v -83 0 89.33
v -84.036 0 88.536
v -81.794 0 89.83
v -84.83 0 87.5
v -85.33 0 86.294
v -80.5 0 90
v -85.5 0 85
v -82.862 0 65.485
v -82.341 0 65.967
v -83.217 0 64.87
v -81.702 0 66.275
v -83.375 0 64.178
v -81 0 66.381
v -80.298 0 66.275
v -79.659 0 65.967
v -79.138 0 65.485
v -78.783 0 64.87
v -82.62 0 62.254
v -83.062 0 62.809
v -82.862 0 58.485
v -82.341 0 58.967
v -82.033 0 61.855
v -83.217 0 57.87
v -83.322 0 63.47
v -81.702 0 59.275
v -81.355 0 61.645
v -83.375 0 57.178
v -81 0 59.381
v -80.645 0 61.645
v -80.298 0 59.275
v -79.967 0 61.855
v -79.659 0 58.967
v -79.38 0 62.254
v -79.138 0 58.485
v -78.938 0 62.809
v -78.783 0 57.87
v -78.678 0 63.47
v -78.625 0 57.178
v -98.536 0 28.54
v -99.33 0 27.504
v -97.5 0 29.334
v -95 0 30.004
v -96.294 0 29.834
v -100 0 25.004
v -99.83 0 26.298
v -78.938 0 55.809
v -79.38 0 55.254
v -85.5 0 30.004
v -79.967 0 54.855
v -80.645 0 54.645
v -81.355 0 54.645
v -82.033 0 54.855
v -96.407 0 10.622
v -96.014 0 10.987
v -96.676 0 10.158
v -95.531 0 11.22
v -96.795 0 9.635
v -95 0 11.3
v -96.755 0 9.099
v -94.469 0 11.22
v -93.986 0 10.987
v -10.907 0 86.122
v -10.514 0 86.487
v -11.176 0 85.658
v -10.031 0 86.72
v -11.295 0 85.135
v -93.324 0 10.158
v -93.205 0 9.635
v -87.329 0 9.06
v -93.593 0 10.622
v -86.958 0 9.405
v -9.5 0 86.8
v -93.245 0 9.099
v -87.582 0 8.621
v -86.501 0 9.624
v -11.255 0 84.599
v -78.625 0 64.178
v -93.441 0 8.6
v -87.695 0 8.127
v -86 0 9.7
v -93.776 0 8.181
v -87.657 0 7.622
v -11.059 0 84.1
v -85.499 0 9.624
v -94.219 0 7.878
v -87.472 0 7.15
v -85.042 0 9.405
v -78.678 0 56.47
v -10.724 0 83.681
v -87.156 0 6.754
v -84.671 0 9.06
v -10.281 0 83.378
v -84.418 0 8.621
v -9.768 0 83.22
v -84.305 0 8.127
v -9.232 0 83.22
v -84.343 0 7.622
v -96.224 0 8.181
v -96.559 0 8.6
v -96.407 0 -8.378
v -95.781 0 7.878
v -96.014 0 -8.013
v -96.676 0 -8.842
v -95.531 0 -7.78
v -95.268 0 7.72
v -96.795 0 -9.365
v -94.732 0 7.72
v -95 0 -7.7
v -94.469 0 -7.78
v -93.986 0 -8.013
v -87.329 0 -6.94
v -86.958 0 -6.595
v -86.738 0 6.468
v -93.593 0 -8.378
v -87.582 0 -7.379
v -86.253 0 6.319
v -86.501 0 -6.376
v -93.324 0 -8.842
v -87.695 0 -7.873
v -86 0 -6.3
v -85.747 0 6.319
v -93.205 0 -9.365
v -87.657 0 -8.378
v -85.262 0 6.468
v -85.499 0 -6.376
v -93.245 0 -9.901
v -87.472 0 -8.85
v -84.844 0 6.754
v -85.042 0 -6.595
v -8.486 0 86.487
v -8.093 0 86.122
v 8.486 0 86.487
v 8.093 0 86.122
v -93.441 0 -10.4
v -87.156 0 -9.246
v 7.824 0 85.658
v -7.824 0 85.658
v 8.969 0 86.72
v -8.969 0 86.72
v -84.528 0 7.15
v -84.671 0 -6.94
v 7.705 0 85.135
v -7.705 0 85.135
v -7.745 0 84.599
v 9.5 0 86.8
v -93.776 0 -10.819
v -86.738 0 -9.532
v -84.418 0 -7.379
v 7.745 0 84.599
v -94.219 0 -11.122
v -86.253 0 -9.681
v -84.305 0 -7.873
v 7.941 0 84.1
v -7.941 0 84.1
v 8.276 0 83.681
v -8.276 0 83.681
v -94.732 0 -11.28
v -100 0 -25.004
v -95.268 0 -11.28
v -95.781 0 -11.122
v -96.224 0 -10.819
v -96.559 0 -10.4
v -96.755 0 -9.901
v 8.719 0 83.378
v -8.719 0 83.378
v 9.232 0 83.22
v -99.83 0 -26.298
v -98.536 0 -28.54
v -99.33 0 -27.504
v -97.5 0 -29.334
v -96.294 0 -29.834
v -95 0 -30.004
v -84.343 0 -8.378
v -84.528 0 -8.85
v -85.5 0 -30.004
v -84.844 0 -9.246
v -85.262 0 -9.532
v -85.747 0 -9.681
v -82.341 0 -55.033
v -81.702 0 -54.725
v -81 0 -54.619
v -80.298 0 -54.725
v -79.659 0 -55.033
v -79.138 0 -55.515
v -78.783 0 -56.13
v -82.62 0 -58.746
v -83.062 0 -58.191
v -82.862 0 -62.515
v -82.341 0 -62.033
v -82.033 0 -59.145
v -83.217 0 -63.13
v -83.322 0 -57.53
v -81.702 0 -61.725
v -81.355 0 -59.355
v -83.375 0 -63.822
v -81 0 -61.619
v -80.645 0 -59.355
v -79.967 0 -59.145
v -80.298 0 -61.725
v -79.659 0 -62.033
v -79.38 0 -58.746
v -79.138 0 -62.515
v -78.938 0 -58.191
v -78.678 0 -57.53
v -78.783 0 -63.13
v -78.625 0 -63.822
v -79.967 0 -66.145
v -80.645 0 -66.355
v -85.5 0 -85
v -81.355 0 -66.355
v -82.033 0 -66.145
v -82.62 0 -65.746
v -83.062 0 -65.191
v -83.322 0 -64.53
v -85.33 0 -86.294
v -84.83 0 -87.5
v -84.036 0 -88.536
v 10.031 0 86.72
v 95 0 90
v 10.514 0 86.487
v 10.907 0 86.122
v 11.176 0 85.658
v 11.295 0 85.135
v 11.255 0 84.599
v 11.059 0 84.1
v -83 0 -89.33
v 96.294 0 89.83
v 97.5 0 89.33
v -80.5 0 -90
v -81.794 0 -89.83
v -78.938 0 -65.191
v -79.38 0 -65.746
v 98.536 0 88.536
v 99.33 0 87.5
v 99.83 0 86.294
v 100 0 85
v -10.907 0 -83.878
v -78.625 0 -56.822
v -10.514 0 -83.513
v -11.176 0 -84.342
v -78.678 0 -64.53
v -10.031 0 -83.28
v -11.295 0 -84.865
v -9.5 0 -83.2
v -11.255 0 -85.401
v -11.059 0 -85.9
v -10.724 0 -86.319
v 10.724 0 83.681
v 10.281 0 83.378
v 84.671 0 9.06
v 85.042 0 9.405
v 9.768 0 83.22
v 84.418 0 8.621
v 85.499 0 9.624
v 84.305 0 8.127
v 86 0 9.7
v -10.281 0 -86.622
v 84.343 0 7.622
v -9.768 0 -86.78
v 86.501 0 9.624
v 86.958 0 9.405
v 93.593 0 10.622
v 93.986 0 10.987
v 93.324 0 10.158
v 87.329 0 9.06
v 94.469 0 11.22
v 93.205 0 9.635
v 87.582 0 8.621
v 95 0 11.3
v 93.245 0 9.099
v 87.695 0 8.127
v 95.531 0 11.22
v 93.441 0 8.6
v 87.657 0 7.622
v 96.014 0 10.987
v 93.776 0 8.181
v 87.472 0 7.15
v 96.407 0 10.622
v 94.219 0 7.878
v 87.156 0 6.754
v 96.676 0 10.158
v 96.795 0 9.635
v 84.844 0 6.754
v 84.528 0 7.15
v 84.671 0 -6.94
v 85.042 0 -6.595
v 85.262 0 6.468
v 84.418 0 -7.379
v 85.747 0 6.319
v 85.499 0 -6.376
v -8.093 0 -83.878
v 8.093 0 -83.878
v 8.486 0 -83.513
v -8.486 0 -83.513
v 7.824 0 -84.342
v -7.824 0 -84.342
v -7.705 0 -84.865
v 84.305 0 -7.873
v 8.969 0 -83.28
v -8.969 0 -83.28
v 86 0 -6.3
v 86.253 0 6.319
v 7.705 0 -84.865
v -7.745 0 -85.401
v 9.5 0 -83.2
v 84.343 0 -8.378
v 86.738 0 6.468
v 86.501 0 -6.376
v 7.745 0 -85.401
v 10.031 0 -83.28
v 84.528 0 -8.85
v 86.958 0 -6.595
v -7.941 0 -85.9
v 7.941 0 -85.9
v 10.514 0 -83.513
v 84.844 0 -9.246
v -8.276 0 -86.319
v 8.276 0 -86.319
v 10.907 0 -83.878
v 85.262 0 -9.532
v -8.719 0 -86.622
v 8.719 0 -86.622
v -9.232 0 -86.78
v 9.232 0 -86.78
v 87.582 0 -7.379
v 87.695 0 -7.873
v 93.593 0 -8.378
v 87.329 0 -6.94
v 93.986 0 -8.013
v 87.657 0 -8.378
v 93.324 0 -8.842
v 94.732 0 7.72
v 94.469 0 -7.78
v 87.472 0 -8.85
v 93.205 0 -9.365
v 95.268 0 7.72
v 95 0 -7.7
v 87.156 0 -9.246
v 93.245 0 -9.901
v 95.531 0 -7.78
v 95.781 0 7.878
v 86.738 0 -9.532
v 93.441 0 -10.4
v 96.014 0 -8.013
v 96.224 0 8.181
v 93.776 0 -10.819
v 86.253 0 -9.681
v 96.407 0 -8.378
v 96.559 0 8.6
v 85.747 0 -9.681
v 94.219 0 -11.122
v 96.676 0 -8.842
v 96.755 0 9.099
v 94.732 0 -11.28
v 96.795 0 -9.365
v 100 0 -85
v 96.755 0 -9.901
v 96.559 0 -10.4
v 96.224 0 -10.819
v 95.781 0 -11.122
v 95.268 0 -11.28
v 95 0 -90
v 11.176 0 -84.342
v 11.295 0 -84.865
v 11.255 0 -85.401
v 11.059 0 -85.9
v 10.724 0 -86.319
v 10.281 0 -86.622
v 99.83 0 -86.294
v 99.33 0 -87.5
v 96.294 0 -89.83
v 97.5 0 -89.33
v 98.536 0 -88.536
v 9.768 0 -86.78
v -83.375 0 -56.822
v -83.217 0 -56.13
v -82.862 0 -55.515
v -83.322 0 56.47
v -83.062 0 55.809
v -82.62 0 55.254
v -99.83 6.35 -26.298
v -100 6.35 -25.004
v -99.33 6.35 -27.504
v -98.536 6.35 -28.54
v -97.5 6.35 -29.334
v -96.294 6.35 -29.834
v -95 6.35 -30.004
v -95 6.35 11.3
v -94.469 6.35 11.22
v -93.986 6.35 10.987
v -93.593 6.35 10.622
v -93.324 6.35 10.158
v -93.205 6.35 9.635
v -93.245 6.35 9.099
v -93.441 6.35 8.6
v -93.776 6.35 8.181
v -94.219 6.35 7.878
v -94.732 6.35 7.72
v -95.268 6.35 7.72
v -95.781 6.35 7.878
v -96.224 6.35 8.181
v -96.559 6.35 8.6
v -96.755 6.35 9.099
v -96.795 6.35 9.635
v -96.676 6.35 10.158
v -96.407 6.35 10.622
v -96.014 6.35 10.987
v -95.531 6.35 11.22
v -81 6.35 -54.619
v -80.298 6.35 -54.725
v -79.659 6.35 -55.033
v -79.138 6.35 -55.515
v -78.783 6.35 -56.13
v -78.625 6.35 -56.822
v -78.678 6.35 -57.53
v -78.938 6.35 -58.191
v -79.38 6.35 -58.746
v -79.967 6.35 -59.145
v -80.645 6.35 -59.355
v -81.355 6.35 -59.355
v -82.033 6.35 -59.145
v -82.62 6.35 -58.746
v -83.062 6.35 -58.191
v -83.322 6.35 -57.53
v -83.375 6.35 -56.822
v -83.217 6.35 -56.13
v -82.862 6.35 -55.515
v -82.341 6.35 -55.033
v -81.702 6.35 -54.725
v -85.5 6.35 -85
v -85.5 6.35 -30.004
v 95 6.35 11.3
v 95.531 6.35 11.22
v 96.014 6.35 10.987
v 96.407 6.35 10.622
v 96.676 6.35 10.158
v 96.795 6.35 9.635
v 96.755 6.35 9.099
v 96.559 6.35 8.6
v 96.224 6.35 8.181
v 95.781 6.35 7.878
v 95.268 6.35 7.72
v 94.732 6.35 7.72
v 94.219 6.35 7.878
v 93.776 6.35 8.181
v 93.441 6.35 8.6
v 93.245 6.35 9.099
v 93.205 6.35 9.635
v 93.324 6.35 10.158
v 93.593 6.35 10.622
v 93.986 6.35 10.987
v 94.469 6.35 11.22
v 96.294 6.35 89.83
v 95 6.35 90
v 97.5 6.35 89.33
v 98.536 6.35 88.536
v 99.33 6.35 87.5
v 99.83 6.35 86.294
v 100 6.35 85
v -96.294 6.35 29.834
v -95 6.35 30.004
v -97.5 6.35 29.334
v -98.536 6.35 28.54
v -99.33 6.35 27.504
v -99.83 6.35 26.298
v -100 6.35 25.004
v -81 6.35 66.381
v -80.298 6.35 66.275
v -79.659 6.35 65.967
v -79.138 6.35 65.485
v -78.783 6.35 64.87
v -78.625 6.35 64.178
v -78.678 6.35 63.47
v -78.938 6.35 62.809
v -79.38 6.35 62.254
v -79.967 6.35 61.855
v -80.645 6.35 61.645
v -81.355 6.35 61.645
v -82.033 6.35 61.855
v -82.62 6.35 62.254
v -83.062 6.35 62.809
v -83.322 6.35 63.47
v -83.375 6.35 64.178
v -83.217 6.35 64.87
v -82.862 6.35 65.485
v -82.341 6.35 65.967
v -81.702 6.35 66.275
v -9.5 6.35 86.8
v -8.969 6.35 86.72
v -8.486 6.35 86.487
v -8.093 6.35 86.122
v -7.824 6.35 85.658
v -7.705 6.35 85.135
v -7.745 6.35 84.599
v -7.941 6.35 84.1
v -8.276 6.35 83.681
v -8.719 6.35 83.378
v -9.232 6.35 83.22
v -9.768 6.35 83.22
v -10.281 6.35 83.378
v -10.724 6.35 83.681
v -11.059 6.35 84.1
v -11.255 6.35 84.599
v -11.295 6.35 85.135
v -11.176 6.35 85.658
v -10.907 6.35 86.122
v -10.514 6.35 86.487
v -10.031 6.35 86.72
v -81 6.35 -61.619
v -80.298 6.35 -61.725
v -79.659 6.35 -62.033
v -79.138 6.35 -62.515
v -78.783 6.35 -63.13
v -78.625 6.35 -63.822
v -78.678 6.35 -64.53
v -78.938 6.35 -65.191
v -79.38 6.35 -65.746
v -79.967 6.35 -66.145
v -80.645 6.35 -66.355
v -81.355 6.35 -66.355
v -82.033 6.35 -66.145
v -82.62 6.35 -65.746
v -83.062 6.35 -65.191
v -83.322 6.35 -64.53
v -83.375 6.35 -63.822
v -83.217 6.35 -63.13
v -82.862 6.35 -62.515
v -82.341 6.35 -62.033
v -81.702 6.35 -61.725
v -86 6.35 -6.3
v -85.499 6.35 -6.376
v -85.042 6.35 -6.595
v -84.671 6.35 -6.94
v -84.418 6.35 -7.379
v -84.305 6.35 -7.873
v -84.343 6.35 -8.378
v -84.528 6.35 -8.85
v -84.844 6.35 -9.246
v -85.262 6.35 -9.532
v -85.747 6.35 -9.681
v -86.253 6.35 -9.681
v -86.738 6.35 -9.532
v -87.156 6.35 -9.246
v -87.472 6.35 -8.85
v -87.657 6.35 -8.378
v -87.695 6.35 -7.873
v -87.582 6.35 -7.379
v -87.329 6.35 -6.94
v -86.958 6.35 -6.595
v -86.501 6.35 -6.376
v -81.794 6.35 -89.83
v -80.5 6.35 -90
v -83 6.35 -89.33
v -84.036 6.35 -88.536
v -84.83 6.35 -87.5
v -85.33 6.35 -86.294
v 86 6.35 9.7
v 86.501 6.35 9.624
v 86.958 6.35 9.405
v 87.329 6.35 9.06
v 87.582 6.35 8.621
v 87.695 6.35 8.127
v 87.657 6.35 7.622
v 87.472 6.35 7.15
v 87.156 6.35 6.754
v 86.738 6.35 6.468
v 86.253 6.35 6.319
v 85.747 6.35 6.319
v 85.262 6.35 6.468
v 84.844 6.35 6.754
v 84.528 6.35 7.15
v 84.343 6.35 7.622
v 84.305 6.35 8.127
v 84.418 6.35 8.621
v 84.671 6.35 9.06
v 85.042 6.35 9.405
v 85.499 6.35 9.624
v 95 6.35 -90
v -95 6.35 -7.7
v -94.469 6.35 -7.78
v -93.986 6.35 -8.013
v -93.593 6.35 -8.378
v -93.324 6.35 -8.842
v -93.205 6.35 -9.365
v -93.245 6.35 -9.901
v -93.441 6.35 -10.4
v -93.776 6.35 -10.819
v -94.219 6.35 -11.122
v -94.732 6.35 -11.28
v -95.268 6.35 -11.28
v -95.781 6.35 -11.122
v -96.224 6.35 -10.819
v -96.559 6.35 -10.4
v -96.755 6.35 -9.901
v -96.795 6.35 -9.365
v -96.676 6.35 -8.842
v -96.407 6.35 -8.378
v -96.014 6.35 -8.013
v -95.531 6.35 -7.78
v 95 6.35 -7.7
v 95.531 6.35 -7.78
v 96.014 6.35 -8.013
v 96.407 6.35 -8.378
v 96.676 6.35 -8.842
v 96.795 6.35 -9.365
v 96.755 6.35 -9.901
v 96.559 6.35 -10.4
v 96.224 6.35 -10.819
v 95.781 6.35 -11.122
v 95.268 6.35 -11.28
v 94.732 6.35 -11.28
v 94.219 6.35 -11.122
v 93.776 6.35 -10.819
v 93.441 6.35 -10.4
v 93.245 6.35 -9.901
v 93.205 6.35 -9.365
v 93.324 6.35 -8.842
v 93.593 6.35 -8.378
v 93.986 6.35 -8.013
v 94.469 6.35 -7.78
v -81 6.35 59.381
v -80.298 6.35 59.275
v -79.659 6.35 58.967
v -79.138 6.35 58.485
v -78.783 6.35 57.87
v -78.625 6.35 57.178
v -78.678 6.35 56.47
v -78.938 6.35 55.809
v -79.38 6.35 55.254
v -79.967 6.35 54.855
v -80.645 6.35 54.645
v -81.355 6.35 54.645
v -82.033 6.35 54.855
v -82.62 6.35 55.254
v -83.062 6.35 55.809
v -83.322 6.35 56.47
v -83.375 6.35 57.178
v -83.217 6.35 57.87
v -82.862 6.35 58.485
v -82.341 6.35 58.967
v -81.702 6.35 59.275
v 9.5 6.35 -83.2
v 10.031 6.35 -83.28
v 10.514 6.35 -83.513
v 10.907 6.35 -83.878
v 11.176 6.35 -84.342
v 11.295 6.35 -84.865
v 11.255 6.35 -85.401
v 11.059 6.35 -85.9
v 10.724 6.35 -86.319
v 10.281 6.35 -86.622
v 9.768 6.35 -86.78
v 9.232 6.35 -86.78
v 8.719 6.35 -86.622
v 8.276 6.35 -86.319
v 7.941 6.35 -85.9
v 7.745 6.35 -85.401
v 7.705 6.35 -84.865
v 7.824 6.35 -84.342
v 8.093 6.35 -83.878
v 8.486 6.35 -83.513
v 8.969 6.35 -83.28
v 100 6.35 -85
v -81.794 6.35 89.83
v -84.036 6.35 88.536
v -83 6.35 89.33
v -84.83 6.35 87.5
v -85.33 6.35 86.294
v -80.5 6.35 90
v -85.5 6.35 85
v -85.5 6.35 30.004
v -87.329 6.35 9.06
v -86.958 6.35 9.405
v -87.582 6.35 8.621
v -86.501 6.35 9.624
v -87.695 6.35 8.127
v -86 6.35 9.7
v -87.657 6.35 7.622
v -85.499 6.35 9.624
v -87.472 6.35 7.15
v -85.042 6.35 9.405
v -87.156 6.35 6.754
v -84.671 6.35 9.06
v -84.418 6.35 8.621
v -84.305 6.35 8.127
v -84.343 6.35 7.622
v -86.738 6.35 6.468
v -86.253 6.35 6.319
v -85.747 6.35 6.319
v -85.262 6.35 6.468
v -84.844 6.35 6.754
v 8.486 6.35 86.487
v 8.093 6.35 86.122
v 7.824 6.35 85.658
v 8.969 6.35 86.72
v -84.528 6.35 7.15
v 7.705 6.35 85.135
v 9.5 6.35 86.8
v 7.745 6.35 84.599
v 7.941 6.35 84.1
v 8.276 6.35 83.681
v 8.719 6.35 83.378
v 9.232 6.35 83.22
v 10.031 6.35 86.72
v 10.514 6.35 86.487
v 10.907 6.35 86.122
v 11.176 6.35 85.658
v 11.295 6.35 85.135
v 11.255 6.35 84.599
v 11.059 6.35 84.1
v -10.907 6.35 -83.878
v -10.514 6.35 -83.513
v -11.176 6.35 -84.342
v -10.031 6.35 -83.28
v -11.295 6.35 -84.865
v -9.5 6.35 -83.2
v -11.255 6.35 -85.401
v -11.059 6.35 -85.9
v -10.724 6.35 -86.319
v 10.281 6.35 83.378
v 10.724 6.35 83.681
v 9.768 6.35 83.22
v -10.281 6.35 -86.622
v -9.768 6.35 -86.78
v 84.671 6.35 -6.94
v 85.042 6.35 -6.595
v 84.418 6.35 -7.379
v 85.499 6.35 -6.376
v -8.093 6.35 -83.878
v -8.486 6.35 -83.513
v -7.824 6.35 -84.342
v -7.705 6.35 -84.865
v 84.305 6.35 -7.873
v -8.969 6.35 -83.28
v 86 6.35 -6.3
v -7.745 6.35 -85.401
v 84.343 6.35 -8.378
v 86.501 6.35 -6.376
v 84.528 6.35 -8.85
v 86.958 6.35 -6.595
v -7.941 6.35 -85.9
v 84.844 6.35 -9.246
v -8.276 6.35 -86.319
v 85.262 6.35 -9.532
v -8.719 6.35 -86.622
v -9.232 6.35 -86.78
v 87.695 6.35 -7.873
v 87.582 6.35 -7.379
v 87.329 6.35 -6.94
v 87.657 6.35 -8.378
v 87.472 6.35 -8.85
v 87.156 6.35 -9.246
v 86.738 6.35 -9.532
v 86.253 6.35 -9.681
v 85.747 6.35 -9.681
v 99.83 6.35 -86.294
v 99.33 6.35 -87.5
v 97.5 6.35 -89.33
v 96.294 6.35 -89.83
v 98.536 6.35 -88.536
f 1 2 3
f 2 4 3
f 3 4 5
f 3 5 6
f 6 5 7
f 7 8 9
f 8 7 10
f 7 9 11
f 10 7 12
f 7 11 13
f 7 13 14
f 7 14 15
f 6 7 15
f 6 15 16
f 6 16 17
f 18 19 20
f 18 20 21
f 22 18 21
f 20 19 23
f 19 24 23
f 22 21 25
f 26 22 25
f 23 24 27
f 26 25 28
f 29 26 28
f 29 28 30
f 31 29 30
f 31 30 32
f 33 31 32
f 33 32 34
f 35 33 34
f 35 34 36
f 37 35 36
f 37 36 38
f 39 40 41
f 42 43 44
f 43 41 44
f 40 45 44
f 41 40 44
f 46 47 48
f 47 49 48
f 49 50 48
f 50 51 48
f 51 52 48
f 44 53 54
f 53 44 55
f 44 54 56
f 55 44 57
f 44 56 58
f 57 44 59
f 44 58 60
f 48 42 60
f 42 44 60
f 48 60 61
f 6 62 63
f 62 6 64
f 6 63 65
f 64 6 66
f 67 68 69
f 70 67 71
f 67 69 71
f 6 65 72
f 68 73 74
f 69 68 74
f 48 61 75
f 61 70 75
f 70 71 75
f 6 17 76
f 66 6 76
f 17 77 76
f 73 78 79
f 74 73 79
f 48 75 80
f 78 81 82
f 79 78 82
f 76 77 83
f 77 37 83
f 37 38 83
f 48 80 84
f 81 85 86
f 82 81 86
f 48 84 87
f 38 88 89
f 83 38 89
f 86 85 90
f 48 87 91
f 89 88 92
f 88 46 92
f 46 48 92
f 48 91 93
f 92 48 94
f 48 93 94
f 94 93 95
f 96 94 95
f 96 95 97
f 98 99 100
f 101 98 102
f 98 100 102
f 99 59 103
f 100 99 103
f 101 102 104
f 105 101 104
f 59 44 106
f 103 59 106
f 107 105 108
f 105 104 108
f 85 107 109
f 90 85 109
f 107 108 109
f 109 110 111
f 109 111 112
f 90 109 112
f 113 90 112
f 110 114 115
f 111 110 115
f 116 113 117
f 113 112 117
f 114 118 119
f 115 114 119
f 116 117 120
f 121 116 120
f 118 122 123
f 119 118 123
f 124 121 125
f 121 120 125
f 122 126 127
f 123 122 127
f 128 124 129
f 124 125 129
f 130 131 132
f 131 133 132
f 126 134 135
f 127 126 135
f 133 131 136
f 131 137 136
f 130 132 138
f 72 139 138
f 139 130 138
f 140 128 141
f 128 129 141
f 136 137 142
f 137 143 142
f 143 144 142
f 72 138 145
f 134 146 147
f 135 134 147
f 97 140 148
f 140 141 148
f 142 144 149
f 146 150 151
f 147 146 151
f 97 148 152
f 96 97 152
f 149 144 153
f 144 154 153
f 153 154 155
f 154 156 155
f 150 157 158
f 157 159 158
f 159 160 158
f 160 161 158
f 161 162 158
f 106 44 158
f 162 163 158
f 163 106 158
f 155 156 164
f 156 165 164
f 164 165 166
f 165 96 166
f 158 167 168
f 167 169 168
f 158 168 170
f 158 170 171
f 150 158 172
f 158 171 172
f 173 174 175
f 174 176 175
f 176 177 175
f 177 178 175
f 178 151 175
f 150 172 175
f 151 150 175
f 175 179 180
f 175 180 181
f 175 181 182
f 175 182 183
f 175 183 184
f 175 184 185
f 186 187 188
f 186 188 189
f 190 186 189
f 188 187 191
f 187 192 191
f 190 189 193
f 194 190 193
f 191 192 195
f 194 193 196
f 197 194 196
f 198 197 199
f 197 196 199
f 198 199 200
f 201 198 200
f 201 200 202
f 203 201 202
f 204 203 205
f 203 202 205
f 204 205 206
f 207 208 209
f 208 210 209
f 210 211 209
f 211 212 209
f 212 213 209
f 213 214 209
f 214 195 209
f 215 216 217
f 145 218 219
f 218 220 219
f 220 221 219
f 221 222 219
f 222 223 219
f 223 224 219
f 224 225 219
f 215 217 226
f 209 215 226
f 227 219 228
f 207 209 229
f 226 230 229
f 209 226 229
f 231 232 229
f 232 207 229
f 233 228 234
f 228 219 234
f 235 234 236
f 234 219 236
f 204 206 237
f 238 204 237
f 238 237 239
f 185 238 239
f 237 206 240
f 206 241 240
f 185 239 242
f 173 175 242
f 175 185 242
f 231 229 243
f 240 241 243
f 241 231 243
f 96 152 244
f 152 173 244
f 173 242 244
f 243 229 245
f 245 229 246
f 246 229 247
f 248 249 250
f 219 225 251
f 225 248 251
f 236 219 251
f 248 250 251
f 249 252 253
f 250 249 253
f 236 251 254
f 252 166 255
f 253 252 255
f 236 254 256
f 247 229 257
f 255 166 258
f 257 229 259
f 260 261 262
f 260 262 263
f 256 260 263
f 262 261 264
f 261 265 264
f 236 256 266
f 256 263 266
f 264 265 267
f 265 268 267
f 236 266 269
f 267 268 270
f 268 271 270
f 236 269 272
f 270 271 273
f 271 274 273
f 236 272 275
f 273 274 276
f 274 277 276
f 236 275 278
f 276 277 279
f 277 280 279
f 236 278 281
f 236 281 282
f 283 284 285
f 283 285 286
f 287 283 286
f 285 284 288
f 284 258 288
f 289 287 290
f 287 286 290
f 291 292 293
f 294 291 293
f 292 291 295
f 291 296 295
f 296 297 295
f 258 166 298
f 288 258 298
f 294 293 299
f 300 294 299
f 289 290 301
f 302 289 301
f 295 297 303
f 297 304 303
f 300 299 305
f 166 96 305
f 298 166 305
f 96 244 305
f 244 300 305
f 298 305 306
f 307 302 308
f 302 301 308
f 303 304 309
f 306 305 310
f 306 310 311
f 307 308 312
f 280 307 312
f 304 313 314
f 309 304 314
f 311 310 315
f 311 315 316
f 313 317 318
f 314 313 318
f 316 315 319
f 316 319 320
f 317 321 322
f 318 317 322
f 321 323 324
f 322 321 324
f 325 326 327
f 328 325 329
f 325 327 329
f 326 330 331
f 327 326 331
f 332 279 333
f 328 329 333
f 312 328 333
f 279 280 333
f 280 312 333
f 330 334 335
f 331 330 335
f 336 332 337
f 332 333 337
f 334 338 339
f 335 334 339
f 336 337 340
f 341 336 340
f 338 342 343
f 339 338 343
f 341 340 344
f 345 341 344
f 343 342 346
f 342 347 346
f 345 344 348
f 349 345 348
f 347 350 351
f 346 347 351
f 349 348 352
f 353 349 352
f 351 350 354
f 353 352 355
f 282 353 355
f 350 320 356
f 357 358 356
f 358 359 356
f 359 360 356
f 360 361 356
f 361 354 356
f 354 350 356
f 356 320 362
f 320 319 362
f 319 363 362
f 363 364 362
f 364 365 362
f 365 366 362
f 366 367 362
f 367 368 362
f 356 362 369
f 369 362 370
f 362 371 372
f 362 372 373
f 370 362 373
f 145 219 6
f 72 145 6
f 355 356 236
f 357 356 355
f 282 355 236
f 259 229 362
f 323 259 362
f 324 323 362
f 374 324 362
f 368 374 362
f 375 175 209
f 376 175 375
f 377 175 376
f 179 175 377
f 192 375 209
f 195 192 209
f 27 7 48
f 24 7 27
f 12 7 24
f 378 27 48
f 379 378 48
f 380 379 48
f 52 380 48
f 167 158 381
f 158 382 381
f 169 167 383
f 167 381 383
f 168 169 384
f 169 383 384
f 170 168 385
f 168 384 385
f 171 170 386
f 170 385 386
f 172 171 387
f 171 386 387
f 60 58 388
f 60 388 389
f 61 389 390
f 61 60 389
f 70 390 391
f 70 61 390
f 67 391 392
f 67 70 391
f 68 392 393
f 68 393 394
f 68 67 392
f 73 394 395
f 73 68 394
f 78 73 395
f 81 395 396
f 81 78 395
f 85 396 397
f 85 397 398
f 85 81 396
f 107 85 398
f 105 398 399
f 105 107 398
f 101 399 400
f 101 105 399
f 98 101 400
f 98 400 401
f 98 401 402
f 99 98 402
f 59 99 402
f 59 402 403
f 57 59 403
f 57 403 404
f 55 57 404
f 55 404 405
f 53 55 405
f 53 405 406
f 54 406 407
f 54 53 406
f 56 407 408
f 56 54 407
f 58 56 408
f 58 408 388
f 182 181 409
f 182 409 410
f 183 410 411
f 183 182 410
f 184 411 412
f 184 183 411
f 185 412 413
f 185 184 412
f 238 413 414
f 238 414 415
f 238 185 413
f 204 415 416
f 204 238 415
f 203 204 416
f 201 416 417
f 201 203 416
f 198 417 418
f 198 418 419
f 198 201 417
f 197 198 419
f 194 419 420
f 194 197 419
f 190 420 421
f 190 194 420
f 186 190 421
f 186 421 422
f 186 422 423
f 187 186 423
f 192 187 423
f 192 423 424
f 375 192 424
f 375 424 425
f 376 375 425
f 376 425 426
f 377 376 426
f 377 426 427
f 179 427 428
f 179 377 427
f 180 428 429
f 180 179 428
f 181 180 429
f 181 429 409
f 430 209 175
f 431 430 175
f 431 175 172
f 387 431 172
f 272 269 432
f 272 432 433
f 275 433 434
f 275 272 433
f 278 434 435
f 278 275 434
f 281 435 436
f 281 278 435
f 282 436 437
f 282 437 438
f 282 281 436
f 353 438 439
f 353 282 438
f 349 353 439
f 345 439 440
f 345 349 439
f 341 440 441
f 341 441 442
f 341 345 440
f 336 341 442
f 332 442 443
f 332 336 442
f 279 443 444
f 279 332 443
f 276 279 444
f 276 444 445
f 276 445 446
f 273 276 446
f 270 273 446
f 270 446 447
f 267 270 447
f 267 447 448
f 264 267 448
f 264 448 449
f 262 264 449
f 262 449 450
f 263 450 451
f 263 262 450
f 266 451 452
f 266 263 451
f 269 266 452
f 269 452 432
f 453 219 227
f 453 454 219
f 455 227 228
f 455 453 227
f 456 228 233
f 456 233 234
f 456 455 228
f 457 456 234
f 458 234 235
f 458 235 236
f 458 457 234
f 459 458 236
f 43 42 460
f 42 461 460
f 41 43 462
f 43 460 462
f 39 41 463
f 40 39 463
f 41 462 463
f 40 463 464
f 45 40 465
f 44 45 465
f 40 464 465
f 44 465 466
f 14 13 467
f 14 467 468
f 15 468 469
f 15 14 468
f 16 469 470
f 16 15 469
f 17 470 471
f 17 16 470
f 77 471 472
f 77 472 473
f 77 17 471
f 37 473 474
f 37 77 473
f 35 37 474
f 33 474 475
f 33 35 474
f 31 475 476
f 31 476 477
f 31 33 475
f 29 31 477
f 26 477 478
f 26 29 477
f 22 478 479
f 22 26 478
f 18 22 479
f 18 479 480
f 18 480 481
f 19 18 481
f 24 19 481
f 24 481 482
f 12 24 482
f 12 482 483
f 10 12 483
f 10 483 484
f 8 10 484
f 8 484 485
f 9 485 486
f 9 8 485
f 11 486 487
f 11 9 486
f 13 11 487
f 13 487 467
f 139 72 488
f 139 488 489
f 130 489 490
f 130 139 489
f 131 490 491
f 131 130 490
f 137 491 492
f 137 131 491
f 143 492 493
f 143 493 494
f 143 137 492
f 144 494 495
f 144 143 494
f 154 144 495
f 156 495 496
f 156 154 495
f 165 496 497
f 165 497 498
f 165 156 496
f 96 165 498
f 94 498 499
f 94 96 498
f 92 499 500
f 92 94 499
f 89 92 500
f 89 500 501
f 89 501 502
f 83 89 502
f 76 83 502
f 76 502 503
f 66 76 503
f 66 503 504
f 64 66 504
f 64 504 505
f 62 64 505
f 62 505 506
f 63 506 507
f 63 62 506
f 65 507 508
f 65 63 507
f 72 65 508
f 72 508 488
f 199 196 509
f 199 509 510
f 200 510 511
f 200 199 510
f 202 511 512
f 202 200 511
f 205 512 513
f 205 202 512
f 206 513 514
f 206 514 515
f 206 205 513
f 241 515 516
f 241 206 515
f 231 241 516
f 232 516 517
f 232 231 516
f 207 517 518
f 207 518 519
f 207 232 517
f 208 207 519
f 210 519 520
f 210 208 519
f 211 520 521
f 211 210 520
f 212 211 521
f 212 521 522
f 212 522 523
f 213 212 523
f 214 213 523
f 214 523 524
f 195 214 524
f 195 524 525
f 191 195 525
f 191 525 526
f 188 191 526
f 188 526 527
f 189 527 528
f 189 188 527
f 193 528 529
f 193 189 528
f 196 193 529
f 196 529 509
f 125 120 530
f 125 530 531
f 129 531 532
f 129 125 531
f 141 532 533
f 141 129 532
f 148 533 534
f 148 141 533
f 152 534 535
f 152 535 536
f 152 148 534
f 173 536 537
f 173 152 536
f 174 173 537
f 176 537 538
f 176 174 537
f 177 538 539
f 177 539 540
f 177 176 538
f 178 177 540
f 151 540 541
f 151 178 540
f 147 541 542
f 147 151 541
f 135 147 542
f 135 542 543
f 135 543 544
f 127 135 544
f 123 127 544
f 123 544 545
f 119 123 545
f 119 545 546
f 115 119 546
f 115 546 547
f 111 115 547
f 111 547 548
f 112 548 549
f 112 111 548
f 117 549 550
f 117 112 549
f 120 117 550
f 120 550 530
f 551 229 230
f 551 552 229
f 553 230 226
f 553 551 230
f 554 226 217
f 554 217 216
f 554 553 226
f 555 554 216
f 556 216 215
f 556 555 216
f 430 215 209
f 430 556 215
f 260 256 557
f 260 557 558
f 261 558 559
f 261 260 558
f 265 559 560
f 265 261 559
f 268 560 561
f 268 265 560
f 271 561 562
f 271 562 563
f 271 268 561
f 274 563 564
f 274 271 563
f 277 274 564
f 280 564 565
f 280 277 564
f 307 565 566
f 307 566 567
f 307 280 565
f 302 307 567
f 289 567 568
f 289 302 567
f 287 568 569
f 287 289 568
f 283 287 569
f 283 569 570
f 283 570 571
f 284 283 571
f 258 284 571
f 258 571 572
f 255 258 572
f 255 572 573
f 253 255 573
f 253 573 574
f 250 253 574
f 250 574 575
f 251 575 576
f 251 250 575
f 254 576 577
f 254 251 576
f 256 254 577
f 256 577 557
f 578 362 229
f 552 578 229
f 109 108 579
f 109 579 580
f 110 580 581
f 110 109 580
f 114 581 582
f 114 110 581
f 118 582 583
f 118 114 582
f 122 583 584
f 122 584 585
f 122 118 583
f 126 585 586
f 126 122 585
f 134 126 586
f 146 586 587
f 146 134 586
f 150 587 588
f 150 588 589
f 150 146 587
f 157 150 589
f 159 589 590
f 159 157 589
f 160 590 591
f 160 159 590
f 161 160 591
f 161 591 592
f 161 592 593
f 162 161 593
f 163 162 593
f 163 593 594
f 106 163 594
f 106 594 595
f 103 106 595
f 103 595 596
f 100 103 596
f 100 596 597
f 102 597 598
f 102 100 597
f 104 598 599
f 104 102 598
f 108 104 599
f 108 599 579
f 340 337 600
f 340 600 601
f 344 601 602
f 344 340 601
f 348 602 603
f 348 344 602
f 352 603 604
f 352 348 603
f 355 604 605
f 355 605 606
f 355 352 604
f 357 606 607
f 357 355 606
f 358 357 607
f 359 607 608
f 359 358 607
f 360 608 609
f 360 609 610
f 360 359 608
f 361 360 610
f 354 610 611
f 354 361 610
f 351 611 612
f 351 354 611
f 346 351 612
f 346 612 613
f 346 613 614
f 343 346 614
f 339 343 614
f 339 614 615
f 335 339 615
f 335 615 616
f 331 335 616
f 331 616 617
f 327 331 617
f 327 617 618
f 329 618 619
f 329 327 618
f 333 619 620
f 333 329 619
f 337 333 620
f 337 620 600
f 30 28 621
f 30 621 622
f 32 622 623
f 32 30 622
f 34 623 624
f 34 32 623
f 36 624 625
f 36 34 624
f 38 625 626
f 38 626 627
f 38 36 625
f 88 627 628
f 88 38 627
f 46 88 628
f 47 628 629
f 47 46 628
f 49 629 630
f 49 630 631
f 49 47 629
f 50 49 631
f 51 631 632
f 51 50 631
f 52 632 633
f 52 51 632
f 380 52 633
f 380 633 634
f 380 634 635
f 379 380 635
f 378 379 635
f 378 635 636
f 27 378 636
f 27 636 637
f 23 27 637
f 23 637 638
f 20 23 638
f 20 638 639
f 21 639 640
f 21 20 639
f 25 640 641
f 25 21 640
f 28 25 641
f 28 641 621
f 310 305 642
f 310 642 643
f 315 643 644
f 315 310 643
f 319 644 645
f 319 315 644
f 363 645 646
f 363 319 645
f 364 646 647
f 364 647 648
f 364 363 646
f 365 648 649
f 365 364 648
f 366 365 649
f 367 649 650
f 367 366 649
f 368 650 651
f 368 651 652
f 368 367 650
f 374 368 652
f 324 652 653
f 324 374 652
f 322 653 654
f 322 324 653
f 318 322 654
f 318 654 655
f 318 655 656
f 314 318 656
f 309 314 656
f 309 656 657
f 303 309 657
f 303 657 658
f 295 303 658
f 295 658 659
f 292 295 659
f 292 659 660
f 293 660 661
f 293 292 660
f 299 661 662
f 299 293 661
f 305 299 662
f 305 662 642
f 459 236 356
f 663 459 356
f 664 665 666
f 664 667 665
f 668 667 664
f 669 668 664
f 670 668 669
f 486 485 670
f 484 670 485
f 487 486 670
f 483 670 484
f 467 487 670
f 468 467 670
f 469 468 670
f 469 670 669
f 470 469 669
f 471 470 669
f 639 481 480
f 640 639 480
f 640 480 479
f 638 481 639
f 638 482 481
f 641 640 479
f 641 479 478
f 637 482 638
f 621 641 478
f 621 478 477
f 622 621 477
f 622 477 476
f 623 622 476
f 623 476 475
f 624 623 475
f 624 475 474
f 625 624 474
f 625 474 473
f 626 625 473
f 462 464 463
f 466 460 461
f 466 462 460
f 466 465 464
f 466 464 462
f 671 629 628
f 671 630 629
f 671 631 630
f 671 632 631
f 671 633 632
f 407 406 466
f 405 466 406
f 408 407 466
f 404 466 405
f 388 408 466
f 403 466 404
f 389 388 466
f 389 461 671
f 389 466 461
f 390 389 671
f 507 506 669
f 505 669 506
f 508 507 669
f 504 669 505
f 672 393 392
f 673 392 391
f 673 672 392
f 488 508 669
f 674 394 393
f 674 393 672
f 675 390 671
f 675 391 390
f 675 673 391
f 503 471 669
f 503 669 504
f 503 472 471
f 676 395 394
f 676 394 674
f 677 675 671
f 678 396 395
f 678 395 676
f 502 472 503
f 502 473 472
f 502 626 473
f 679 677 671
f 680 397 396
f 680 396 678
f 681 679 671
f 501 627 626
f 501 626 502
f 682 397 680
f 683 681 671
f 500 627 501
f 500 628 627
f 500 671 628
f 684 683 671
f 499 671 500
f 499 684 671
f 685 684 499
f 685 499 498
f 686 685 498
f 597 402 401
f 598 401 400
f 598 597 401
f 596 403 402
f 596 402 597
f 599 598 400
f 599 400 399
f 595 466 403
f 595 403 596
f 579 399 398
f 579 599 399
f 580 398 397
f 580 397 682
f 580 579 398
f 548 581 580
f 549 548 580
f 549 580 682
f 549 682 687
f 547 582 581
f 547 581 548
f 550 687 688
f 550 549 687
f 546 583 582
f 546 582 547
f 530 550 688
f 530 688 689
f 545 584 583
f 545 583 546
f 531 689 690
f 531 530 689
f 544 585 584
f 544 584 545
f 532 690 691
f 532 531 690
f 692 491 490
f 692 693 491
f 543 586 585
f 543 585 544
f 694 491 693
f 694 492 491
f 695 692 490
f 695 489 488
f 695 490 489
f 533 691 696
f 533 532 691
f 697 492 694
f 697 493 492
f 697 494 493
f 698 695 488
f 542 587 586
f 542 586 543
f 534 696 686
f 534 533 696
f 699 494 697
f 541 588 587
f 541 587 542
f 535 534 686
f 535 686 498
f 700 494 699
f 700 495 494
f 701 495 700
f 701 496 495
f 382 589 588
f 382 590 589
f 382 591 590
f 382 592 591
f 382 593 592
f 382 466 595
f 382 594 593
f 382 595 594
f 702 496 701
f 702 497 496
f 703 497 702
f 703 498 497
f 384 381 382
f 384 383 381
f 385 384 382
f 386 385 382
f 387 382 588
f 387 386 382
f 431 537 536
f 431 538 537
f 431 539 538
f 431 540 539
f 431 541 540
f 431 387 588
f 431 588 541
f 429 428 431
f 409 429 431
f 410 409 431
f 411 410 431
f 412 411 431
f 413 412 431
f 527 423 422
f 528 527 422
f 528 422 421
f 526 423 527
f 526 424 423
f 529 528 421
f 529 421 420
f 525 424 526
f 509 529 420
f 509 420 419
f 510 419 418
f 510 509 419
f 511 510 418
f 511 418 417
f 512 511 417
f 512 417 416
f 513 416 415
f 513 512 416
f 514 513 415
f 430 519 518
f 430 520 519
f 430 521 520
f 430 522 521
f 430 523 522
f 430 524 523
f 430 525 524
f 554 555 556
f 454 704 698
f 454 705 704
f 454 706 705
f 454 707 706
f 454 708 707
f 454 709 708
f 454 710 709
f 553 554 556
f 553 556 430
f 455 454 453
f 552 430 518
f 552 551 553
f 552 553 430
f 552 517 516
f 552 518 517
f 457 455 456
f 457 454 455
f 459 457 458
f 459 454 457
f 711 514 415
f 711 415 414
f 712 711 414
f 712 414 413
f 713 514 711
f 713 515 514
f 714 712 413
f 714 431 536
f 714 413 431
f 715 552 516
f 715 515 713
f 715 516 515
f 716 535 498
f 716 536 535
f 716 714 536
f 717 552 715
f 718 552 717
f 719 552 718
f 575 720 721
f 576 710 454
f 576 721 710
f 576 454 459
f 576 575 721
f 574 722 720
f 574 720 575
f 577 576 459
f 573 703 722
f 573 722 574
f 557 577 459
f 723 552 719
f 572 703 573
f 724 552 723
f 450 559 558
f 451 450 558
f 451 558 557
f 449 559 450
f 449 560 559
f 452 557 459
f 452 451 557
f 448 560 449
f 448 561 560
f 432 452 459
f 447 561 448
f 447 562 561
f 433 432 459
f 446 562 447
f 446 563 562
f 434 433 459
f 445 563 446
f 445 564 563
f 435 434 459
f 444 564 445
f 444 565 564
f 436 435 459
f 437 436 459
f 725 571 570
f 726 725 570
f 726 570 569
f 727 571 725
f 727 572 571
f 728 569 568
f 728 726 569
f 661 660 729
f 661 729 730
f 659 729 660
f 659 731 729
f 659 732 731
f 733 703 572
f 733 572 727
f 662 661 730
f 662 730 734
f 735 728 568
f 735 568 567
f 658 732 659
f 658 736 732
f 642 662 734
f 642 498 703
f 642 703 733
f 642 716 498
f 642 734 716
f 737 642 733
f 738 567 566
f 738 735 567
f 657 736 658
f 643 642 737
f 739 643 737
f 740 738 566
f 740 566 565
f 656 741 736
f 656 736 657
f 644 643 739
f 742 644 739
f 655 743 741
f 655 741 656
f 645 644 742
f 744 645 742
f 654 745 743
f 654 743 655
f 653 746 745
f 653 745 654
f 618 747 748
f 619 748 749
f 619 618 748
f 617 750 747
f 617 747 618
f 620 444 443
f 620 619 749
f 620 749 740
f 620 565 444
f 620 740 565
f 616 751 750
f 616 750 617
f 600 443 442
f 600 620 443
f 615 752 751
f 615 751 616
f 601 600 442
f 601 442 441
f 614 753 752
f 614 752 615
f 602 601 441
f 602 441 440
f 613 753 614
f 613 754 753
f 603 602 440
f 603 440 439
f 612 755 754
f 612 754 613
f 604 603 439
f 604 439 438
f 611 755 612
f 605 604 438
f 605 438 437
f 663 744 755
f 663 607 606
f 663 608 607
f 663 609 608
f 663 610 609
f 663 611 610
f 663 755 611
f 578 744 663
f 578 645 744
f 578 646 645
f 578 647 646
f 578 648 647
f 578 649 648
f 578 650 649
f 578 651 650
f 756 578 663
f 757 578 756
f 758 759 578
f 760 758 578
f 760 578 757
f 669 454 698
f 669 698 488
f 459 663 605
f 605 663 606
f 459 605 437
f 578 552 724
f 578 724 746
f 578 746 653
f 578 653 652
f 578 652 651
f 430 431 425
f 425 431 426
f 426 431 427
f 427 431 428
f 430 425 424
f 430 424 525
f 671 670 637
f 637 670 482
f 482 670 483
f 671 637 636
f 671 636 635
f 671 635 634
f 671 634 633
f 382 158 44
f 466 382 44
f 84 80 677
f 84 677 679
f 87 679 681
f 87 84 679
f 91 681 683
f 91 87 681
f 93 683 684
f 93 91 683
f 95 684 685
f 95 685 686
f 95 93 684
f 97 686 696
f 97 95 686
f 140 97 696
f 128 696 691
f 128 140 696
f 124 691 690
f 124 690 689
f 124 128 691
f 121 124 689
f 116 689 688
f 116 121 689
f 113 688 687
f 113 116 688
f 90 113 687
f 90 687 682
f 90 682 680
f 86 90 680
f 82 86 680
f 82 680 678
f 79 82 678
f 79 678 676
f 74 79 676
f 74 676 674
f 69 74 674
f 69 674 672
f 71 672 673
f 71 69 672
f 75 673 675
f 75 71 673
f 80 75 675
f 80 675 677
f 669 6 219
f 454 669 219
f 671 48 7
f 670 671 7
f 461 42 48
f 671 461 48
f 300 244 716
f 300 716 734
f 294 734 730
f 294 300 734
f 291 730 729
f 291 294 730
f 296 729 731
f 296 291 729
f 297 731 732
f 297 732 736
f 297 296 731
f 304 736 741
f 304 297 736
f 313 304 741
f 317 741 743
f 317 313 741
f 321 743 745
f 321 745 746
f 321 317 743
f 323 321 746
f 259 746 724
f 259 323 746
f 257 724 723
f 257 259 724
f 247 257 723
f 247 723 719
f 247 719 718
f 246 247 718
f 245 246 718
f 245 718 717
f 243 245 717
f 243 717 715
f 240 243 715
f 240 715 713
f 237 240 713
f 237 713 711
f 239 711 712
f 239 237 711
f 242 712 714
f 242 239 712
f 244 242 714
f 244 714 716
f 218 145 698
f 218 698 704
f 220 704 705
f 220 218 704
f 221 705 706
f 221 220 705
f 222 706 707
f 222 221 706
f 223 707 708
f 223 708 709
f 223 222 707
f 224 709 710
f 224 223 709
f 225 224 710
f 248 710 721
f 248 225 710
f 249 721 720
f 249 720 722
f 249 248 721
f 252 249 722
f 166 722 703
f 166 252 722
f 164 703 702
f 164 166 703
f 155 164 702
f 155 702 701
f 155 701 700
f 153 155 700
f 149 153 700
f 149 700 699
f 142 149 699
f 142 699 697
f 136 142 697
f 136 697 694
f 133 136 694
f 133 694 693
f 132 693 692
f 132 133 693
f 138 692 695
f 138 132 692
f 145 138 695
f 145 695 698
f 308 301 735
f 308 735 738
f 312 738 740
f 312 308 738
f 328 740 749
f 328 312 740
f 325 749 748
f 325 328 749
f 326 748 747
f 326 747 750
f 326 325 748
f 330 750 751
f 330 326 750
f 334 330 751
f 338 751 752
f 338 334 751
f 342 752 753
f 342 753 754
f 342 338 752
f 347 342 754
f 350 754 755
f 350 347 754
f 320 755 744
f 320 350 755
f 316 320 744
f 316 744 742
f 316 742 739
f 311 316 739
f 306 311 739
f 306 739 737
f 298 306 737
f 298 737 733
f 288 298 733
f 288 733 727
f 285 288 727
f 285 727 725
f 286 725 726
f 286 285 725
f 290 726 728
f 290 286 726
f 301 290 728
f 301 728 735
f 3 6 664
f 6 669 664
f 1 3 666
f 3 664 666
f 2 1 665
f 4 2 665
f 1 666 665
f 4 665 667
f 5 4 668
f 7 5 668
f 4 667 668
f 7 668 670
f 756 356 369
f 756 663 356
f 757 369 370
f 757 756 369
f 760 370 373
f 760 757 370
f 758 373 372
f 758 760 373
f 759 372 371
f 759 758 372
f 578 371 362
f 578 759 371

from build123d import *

# Parameters (mm, degrees)
SKETCH2_R           = 2.38125
SKETCH2_R_2         = 1.8
SKETCH2_R_3         = 1.7
BOSS_EXTRUDE1_DEPTH = 6.35
FILLET1_R           = 5


with BuildPart() as part:
    # Sketch2 → Boss-Extrude1 (new body)
    with BuildSketch(Plane(origin=(0, 0, 0), x_dir=(1, 0, 0), z_dir=(0, 1, 0))):
        Polygon((-85.5, -90), (100, -90), (100, 90), (-85.5, 90), (-85.5, 30.004081815), (-100, 30.004081815), (-100, -30.004081815), (-85.5, -30.004081815), align=None)
        with Locations(Location((-81, -64, 0), (0, 0, 270))):
            Circle(SKETCH2_R, mode=Mode.SUBTRACT)
        with Locations(Location((-81, -57, 0), (0, 0, 270))):
            Circle(SKETCH2_R, mode=Mode.SUBTRACT)
        with Locations(Location((-9.5, -85, 0), (0, 0, 270))):
            Circle(SKETCH2_R_2, mode=Mode.SUBTRACT)
        with Locations(Location((-95, -9.5, 0), (0, 0, 270))):
            Circle(SKETCH2_R_2, mode=Mode.SUBTRACT)
        with Locations(Location((-86, -8, 0), (0, 0, 270))):
            Circle(SKETCH2_R_3, mode=Mode.SUBTRACT)
        with Locations(Location((9.5, -85, 0), (0, 0, 270))):
            Circle(SKETCH2_R_2, mode=Mode.SUBTRACT)
        with Locations(Location((86, -8, 0), (0, 0, 270))):
            Circle(SKETCH2_R_3, mode=Mode.SUBTRACT)
        with Locations(Location((95, -9.5, 0), (0, 0, 270))):
            Circle(SKETCH2_R_2, mode=Mode.SUBTRACT)
        with Locations(Location((-95, 9.5, 0), (0, 0, 270))):
            Circle(SKETCH2_R_2, mode=Mode.SUBTRACT)
        with Locations(Location((-86, 8, 0), (0, 0, 270))):
            Circle(SKETCH2_R_3, mode=Mode.SUBTRACT)
        with Locations(Location((-81, 57, 0), (0, 0, 270))):
            Circle(SKETCH2_R, mode=Mode.SUBTRACT)
        with Locations(Location((-81, 64, 0), (0, 0, 270))):
            Circle(SKETCH2_R, mode=Mode.SUBTRACT)
        with Locations(Location((-9.5, 85, 0), (0, 0, 270))):
            Circle(SKETCH2_R_2, mode=Mode.SUBTRACT)
        with Locations(Location((86, 8, 0), (0, 0, 270))):
            Circle(SKETCH2_R_3, mode=Mode.SUBTRACT)
        with Locations(Location((95, 9.5, 0), (0, 0, 270))):
            Circle(SKETCH2_R_2, mode=Mode.SUBTRACT)
        with Locations(Location((9.5, 85, 0), (0, 0, 270))):
            Circle(SKETCH2_R_2, mode=Mode.SUBTRACT)
    extrude(amount=BOSS_EXTRUDE1_DEPTH)

    # Fillet1
    fillet1_edges = [part.edges().sort_by_distance(p)[0] for p in [
        (-100, 3.175, 30.004081815),
        (-100, 3.175, -30.004081815),
        (-85.5, 3.175, -90),
        (100, 3.175, -90),
        (100, 3.175, 90),
        (-85.5, 3.175, 90),
    ]]
    fillet(fillet1_edges, radius=FILLET1_R)


solid = part.part
